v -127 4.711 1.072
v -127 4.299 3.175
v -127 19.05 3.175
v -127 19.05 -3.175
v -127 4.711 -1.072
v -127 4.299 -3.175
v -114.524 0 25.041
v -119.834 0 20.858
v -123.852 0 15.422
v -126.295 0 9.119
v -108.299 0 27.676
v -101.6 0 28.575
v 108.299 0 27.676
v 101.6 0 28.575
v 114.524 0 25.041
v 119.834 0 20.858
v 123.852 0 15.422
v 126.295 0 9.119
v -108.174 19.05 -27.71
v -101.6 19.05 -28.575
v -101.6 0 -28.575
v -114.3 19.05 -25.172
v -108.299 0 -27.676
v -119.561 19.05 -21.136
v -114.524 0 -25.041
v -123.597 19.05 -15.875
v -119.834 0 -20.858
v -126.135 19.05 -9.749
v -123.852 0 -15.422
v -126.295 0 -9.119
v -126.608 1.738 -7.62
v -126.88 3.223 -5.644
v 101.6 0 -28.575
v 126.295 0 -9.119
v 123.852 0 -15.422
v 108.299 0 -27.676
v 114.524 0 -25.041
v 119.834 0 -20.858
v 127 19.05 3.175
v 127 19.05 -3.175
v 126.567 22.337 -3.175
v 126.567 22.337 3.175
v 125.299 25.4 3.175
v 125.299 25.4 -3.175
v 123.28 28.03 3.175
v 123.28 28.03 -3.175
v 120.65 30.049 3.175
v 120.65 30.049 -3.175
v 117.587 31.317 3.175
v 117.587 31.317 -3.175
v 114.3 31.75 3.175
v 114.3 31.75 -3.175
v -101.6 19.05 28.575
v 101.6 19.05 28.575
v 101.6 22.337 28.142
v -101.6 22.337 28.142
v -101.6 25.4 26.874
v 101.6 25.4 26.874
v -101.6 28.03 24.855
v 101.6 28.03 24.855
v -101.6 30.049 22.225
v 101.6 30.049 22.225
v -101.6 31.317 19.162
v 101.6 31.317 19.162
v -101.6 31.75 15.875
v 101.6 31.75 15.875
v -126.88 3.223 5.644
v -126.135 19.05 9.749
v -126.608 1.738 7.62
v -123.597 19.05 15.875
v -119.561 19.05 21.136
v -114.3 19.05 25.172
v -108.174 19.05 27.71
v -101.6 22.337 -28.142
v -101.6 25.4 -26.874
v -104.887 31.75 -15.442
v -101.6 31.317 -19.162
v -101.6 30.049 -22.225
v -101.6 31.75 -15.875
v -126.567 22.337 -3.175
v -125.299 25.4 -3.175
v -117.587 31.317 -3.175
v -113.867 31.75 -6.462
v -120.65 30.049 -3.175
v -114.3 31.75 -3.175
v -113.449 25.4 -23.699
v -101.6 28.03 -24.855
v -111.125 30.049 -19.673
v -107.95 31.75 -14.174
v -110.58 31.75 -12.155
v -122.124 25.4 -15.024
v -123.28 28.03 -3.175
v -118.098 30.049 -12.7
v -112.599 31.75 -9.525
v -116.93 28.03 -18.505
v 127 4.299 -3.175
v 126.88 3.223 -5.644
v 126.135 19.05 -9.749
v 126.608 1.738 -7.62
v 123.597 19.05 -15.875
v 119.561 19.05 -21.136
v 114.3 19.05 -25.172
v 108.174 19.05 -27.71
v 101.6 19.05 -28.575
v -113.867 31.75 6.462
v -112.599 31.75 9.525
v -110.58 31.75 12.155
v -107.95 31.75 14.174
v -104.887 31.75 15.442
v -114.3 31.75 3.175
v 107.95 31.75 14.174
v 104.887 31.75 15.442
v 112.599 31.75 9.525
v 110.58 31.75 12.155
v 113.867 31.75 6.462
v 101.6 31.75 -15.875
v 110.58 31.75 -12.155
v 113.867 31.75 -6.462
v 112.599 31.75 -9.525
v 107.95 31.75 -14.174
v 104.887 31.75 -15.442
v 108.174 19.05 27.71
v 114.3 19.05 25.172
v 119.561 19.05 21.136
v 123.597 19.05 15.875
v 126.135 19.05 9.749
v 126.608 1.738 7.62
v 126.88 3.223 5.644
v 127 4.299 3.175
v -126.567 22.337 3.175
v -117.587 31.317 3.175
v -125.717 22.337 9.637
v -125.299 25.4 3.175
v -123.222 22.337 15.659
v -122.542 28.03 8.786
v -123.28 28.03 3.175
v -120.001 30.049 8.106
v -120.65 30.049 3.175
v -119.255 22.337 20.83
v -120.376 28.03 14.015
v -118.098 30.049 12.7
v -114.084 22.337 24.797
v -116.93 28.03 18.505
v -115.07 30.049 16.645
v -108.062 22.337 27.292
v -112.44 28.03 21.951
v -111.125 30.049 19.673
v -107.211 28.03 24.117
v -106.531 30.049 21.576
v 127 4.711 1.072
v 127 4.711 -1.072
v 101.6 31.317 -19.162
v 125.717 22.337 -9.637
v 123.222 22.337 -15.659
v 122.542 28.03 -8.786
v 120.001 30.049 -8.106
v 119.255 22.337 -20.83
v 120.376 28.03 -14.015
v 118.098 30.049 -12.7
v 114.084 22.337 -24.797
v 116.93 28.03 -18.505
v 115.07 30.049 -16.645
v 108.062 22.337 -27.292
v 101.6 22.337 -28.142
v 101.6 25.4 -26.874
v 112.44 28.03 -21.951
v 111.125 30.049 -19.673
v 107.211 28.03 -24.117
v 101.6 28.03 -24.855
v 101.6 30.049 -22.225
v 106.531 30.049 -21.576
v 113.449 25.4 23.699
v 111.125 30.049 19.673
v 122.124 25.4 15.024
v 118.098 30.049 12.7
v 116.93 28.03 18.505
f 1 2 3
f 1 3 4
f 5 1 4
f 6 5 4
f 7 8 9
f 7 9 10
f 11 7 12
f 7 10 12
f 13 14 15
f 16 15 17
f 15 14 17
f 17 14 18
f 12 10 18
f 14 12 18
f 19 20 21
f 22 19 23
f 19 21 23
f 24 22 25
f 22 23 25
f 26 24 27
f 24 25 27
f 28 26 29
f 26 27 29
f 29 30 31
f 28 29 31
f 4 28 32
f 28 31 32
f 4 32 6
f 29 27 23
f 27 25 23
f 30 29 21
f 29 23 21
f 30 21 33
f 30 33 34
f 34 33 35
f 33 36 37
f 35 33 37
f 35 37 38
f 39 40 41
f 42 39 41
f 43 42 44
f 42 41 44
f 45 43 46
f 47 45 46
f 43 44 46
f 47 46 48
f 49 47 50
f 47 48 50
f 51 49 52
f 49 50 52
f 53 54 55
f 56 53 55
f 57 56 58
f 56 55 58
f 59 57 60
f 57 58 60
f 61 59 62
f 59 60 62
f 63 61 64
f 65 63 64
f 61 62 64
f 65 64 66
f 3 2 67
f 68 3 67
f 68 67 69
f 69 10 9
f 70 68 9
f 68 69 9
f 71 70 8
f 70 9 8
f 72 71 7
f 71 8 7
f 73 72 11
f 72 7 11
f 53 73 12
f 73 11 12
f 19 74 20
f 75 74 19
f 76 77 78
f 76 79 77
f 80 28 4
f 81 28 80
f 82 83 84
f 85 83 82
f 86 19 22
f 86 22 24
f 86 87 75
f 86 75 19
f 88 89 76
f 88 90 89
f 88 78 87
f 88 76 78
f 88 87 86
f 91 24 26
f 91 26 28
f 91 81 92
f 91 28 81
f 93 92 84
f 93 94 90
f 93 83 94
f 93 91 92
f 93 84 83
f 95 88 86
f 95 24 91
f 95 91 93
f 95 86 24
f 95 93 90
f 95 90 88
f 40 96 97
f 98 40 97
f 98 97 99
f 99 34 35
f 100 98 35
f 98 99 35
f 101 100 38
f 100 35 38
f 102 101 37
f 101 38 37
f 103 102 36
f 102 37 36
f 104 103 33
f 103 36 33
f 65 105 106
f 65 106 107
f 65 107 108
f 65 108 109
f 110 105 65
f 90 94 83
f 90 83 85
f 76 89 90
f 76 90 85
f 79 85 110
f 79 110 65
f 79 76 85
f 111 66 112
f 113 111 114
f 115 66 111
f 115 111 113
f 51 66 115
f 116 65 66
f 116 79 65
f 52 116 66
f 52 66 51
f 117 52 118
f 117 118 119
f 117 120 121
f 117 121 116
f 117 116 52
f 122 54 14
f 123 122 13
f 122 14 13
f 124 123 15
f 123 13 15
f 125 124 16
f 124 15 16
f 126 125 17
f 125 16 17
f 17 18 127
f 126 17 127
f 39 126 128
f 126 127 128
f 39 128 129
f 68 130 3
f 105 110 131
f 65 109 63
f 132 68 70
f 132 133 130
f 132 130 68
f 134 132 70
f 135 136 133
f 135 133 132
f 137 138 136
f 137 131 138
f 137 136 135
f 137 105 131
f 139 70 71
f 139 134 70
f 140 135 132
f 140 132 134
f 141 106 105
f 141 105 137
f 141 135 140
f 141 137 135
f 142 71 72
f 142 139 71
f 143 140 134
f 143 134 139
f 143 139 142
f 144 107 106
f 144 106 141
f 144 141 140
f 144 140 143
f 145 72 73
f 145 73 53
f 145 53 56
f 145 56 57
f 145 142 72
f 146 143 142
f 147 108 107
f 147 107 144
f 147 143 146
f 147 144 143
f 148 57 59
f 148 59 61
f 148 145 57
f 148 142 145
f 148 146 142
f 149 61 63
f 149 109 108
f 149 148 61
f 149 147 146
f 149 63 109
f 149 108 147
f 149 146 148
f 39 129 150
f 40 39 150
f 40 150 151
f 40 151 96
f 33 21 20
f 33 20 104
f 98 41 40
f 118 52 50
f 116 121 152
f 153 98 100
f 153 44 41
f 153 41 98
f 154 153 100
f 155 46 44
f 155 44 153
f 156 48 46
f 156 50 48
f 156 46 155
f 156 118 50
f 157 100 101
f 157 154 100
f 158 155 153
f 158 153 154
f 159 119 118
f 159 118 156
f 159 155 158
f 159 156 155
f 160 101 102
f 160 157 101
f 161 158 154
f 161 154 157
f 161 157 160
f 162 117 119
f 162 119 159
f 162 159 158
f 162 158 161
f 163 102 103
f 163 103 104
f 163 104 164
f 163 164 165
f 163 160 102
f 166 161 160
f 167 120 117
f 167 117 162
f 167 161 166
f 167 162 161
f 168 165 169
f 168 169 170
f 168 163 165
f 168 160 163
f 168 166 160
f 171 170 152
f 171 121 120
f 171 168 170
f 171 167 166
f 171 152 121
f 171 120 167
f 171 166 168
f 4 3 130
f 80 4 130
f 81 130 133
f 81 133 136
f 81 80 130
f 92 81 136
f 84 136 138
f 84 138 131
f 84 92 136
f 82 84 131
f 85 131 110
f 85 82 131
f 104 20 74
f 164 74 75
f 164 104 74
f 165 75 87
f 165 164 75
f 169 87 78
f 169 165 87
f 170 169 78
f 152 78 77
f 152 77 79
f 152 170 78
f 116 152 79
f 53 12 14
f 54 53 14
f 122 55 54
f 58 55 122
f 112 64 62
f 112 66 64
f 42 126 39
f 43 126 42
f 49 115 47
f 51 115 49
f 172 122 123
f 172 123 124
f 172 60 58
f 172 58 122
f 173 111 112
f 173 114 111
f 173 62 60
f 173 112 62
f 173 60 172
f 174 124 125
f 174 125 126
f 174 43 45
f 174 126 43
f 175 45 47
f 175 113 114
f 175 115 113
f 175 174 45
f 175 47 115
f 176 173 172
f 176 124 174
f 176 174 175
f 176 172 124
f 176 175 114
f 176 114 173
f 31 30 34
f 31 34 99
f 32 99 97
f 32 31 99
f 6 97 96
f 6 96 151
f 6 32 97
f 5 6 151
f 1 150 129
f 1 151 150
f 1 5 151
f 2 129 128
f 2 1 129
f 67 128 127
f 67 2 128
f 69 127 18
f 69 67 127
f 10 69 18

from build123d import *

# Parameters (mm, degrees)
SKETCH1_W               = 254
SKETCH1_H               = 57.15
BOSS_EXTRUDE1_DEPTH     = 31.75
FILLET1_R               = 12.7
FILLET2_R               = 25.4
CUT_EXTRUDE1_DEPTH      = 134.991018822
CUT_EXTRUDE1_DEPTH_BACK = 134.991018822
SKETCH2_R               = 11.1125


with BuildPart() as part:
    # Sketch1 → Boss-Extrude1 (new body)
    with BuildSketch(Plane(origin=(0, 0, 0), x_dir=(1, 0, 0), z_dir=(0, 1, 0))):
        Rectangle(SKETCH1_W, SKETCH1_H)
    extrude(amount=BOSS_EXTRUDE1_DEPTH)

    # Fillet1
    fillet1_edges = [part.edges().sort_by_distance(p)[0] for p in [
        (-127, 31.75, 0),
        (0, 31.75, 28.575),
        (127, 31.75, 0),
        (0, 31.75, -28.575),
    ]]
    fillet(fillet1_edges, radius=FILLET1_R)

    # Fillet2
    # the kernel refuses this fillet: 25.4 mm, written as the material it takes off along each edge
    with BuildSketch(Plane(origin=(101.6, 31.75, -3.175), x_dir=(1, 0, 0), z_dir=(0, 0, 1))) as fillet2_piece_1:
        with BuildLine():
            CenterArc((12.7, -12.7), 12.7, 0, 90)
            Line((25.4, -12.7), (25.4, 0))
            Line((25.4, 0), (12.7, 0))
        make_face()
    revolve(axis=Axis((101.6, 31.75, -3.175), (0, 1, 0)), revolution_arc=90, mode=Mode.SUBTRACT)
    with BuildSketch(Plane(origin=(101.6, 31.75, 3.175), x_dir=(0, 0, 1), z_dir=(-1, 0, 0))) as fillet2_piece_2:
        with BuildLine():
            CenterArc((12.7, -12.7), 12.7, 0, 90)
            Line((25.4, -12.7), (25.4, 0))
            Line((25.4, 0), (12.7, 0))
        make_face()
    revolve(axis=Axis((101.6, 31.75, 3.175), (0, 1, 0)), revolution_arc=90, mode=Mode.SUBTRACT)
    with BuildSketch(Plane(origin=(-101.6, 31.75, -3.175), x_dir=(0, 0, -1), z_dir=(1, 0, 0))) as fillet2_piece_3:
        with BuildLine():
            CenterArc((12.7, -12.7), 12.7, 0, 90)
            Line((25.4, -12.7), (25.4, 0))
            Line((25.4, 0), (12.7, 0))
        make_face()
    revolve(axis=Axis((-101.6, 31.75, -3.175), (0, 1, 0)), revolution_arc=90, mode=Mode.SUBTRACT)
    with BuildSketch(Plane(origin=(-101.6, 31.75, 3.175), x_dir=(-1, 0, 0), z_dir=(0, 0, -1))) as fillet2_piece_4:
        with BuildLine():
            CenterArc((12.7, -12.7), 12.7, 0, 90)
            Line((25.4, -12.7), (25.4, 0))
            Line((25.4, 0), (12.7, 0))
        make_face()
    revolve(axis=Axis((-101.6, 31.75, 3.175), (0, 1, 0)), revolution_arc=90, mode=Mode.SUBTRACT)
    with BuildSketch(Plane(origin=(-127, -63.5, 28.575), x_dir=(0, 0, -1), z_dir=(0, 1, 0)), Plane(origin=(-127, -63.5, -28.575), x_dir=(1, 0, 0), z_dir=(0, 1, 0))) as fillet2_piece_5:
        with BuildLine():
            CenterArc((FILLET2_R, -FILLET2_R), FILLET2_R, 90, 90)
            Line((0, -FILLET2_R), (0, 0))
            Line((0, 0), (FILLET2_R, 0))
        make_face()
    extrude(amount=95.25, mode=Mode.SUBTRACT)
    with BuildSketch(Plane(origin=(127, -63.5, -28.575), x_dir=(-1, 0, 0), z_dir=(0, 1, 0)), Plane(origin=(127, -63.5, 28.575), x_dir=(0, 0, -1), z_dir=(0, 1, 0))) as fillet2_piece_6:
        with BuildLine():
            CenterArc((FILLET2_R, FILLET2_R), FILLET2_R, 180, 90)
            Line((0, FILLET2_R), (0, 0))
            Line((0, 0), (FILLET2_R, 0))
        make_face()
    extrude(amount=95.25, mode=Mode.SUBTRACT)

    # Sketch2 → Cut-Extrude1 (cut, two sides: drawn at the far end of the back side and taken through both)
    with BuildSketch(Plane(origin=(0, 0, 0), x_dir=(0, 0, -1), z_dir=(1, 0, 0)).offset(-CUT_EXTRUDE1_DEPTH_BACK)):
        with Locations((0, -6.35)):
            Circle(SKETCH2_R)
    extrude(amount=CUT_EXTRUDE1_DEPTH + CUT_EXTRUDE1_DEPTH_BACK, mode=Mode.SUBTRACT)


solid = part.part
